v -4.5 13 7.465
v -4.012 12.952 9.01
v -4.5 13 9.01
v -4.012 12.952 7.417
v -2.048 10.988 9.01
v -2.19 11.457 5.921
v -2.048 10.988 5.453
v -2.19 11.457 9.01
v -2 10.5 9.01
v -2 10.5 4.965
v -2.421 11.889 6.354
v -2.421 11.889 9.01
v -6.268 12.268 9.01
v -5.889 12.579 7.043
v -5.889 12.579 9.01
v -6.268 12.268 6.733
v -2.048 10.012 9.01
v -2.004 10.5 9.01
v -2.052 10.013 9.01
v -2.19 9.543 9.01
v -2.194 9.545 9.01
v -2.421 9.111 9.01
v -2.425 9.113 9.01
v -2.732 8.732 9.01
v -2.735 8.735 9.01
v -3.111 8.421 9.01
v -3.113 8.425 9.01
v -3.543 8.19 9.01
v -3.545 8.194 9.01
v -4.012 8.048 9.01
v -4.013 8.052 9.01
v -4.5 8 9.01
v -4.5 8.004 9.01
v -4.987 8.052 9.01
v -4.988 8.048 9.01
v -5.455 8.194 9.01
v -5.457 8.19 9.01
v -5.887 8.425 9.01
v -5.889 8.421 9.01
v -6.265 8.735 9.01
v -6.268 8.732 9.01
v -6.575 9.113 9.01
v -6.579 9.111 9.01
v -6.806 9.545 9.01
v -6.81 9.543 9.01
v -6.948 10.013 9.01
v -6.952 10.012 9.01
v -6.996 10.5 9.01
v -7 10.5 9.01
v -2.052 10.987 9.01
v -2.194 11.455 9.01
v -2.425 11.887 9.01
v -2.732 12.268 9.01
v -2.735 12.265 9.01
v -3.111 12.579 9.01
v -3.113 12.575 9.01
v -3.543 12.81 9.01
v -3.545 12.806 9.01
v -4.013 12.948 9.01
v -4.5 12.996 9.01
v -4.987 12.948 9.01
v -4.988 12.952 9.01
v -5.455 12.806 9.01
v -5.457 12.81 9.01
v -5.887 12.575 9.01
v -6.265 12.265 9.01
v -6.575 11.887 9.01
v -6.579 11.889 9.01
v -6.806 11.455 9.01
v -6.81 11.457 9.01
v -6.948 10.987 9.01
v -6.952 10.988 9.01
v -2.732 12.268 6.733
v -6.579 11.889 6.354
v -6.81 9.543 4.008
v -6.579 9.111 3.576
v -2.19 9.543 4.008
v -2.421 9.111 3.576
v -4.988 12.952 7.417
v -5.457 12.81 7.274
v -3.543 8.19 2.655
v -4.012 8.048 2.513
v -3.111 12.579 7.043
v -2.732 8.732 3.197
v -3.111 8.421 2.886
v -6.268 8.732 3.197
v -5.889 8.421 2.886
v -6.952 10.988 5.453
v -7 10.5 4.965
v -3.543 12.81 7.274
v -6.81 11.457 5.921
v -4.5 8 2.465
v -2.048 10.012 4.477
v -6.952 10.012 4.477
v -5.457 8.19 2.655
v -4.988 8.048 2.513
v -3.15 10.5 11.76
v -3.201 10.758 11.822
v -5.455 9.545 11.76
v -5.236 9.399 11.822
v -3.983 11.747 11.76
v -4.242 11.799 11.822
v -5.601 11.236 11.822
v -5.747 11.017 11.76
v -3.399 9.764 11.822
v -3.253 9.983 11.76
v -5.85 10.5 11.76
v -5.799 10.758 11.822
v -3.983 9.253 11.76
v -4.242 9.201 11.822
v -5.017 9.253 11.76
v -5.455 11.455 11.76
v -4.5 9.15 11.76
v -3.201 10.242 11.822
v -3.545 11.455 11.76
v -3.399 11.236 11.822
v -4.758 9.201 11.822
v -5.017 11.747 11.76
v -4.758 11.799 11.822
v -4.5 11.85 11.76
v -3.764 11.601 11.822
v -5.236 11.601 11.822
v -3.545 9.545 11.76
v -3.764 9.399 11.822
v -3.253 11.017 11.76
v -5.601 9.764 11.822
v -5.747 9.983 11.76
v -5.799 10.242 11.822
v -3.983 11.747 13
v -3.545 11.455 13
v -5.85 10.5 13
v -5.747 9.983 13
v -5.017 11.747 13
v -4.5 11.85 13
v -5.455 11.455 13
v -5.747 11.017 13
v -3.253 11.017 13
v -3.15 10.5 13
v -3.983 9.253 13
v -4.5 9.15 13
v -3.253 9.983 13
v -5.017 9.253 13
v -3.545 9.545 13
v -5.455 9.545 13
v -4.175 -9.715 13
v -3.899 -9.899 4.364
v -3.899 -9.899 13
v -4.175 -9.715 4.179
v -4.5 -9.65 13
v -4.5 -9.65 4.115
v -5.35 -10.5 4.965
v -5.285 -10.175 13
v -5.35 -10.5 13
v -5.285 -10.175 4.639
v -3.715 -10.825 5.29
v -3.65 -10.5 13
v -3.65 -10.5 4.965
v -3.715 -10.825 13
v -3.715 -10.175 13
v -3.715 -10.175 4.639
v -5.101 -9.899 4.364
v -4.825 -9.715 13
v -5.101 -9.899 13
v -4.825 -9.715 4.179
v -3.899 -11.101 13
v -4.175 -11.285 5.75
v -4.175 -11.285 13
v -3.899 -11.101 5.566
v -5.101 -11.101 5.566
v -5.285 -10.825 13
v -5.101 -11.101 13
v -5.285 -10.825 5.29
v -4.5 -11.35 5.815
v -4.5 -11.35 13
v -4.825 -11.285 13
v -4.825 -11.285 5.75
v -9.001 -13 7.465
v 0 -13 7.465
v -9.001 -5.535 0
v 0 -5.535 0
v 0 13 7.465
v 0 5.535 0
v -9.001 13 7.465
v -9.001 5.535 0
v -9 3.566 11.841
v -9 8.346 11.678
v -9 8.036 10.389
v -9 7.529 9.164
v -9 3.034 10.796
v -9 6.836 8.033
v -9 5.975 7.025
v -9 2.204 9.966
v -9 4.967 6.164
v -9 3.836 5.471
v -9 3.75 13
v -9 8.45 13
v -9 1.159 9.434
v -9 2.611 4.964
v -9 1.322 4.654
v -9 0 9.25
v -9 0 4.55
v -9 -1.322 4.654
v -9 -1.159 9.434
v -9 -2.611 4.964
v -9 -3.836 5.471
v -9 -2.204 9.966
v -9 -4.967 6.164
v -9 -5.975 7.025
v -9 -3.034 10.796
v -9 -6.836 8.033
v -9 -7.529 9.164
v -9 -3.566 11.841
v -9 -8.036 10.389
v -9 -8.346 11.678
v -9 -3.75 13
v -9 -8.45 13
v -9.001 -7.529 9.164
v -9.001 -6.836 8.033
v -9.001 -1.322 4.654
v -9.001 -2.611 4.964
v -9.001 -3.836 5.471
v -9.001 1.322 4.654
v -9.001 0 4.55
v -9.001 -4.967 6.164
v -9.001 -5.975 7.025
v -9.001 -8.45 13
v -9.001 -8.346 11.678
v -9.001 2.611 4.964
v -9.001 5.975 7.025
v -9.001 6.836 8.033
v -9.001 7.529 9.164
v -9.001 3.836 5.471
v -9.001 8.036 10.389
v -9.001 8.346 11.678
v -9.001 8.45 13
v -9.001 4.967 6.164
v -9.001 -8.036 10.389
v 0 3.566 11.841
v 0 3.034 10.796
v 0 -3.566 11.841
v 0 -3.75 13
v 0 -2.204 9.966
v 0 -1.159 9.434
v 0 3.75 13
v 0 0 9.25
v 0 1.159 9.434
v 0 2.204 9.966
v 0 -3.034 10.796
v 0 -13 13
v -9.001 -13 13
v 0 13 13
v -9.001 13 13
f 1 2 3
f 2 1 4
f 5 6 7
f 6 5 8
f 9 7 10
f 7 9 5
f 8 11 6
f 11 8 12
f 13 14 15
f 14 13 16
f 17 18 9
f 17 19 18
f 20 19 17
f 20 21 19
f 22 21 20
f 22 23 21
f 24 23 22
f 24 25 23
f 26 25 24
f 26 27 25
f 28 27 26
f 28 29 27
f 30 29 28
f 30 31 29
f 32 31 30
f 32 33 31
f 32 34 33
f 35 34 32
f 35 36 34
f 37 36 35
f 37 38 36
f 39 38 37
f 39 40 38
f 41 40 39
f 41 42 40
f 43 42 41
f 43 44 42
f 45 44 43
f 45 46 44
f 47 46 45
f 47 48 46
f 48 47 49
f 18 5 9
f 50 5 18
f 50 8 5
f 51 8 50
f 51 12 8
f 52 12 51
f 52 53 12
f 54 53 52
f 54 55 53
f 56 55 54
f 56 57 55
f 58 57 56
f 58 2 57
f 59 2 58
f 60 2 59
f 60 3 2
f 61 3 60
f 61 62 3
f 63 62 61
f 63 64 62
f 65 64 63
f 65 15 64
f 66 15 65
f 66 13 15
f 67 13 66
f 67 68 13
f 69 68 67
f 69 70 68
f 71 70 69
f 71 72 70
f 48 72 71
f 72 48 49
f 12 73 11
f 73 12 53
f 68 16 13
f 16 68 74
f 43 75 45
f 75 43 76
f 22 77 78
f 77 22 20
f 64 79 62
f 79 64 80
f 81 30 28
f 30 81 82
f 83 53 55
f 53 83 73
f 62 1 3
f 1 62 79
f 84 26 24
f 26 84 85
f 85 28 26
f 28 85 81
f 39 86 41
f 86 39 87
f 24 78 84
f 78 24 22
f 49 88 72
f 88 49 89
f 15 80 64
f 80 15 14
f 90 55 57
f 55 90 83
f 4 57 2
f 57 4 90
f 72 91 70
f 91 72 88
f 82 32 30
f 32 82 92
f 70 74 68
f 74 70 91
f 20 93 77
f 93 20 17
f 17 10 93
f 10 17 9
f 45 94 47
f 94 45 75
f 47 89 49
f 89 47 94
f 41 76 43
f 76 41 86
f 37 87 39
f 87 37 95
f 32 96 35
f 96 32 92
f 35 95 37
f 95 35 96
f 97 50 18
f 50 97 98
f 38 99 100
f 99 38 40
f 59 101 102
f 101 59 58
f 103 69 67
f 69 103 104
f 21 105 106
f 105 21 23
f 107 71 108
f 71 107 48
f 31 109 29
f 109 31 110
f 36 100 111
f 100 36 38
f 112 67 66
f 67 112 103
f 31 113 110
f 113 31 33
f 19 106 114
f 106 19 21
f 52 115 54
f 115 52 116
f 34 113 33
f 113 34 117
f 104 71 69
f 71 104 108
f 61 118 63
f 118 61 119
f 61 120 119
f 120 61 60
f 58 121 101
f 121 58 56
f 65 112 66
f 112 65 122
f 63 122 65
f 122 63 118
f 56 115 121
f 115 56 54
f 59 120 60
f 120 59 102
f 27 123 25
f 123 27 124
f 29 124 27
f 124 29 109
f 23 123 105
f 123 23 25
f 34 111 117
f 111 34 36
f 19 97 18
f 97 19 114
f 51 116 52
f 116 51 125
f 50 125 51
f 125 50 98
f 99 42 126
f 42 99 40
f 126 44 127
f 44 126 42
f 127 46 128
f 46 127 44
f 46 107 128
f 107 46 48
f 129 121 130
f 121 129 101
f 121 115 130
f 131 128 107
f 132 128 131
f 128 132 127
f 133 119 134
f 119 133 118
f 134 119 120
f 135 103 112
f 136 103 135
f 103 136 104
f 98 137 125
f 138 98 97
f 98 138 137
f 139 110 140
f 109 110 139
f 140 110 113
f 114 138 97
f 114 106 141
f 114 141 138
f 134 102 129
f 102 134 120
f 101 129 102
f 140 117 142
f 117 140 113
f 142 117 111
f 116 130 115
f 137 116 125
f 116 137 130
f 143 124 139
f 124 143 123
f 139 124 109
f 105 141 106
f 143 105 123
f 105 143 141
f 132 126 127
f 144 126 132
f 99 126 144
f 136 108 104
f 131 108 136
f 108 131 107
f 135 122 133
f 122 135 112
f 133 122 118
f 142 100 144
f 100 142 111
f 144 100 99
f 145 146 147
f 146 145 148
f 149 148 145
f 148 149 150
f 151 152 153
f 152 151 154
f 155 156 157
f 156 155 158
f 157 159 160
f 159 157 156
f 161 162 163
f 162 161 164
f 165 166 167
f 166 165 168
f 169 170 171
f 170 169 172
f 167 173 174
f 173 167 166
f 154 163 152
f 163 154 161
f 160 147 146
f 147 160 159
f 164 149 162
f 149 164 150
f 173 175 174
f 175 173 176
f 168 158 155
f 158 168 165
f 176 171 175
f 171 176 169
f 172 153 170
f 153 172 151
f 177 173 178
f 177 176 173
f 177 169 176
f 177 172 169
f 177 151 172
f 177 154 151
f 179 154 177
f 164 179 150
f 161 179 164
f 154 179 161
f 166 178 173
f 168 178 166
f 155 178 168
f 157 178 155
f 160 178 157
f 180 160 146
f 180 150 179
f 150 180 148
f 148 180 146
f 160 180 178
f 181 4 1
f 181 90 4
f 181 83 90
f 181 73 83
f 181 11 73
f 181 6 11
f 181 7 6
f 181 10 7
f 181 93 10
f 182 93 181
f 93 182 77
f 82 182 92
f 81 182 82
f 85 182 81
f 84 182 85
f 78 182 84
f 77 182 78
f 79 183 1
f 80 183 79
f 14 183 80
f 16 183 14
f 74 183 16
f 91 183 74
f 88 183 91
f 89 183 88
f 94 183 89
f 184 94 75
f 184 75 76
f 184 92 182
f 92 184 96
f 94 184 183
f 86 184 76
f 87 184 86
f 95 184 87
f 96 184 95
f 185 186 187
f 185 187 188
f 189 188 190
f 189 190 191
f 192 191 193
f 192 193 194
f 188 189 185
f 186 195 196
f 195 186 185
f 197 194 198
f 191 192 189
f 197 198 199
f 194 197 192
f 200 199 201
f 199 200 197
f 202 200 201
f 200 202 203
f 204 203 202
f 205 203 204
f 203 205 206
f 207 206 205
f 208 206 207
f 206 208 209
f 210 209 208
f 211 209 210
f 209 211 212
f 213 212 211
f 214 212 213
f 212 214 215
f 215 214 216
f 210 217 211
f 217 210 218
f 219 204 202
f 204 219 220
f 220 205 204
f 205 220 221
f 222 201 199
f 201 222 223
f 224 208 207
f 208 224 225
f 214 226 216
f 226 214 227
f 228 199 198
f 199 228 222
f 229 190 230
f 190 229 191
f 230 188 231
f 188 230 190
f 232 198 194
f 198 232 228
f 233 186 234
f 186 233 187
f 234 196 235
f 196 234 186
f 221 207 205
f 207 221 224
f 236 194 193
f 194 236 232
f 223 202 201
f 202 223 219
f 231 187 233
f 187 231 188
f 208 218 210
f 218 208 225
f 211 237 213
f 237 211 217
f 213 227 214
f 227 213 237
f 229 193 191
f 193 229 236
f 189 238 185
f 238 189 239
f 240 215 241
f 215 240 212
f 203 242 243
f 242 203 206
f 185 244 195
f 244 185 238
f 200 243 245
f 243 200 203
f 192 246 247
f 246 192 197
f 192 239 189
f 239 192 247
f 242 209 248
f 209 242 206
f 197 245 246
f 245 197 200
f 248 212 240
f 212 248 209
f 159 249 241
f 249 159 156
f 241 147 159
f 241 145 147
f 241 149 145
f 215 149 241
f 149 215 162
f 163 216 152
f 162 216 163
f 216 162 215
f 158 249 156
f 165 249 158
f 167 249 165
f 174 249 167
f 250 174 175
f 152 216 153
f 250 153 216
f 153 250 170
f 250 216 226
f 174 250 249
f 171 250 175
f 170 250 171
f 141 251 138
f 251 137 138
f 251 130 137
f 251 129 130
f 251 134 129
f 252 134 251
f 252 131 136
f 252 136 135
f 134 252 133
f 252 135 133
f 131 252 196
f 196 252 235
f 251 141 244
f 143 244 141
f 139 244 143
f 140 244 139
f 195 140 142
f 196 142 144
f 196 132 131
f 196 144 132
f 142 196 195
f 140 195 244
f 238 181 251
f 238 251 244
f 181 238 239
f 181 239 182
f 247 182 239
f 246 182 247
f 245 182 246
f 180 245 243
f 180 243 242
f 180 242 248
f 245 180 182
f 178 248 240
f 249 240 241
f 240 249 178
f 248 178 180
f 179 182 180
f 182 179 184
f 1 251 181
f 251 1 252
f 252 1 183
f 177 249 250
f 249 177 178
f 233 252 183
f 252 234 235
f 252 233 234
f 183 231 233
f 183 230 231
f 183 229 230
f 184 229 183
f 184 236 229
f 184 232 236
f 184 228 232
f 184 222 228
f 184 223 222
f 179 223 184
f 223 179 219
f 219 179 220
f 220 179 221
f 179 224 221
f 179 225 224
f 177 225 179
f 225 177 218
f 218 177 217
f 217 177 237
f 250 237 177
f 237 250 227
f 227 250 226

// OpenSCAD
// file: nut_cutter.scad
module nut_cutter(w=5.65,depth=6,ins_delta=0.4,ins_depth=2,trans_depth=3)
{
    d=0; // z position
    chep_nut_d=w * (2/sqrt(3)); // nut tight hex
    chep_nut_depth=depth; // total depth
    chep_nut_ins_d=chep_nut_d+ins_delta; // enlarged insertion hex
    chep_nut_ins_depth=ins_depth; // insertion depth
    chep_nut_transition_depth=trans_depth; // easier 3D print, conical transition

    // duboki tijesni utor za maticu
    translate([0,0,-d/2+chep_nut_depth/2-0.001])
      cylinder(d=chep_nut_d,h=chep_nut_depth,$fn=6,center=true);
    // plitki labavi utor za maticu
    translate([0,0,-d/2+chep_nut_ins_depth/2-0.001])
      cylinder(d=chep_nut_ins_d,h=chep_nut_ins_depth,$fn=6,center=true);
    // konusni prijelaz za lakše printanje
    if(1)
    translate([0,0,-d/2+chep_nut_depth+chep_nut_transition_depth/2-0.001])
      cylinder(d1=chep_nut_d,d2=0,h=chep_nut_transition_depth+0.005,$fn=6,center=true);
}

module head_cutter(d=6,h=5)
{
  delta=0.01;
  translate([0,0,-delta])
  cylinder(d=d,h=h+2*delta,$fn=32);
  translate([0,0,h])
    cylinder(d1=d,d2=0,h*2/3,$fn=32);
    
}

//nut_cutter();
//head_cutter();
// main file
// for tube 8x6x1

/* all measures in mm */
// 0.8mm nozzle 0.3mm layer
include <nut_cutter.scad>

/* todo:
** [x] dent holes must be aligned, not dents
** [x] narrower and smaller big dents
** [x] intercusp strain release smaller, 0.1mm
** [x] remove intercuspidation
** [x] M3 thread: -0.15
** [x] M4 thread: -0.20, waterdrop
** [x] 30 mm mount holes M4
** [x] thread for M4
** [x] cut-snap 2 piece
** [x] subtract cube, leave only lower cut-snap
** [x] 2 screws M3 to tighten cut-snap
** [x] thread for M3
** [x] remove some dents - cannot assemble!!
*/

/* Z-extrusion height (vertical) enough to hold M3 screw hole */
zdim = 20;
/* X-length */
xdim = 26;
/* Y-width */
ydim = 26;

/* free space between parts */
freespace_big = 0.2;
freespace_small = 0.0;

/* number of small dents */
ndent1 = 40;
/* dent depth */
ddent1 = 0.0; // 0.5 default, 0 to disable
/* dent width large */
wdent1l = 0.8;
/* dent width small */
wdent1s = 0.3; 
/* big wheel radius (with dents d = 16.7mm)  */
rbig = (16.7+freespace_big)/2;
/* big wheel height */
zbig = 5;

/* number of big dents = half of small dents */
ndent2 = ndent1/2;
/* dent depth */
ddent2 = 0.5; // 0.5 default, 0.0 to disable
/* dent width large */
wdent2l = 0.8;
/* dent width small */
wdent2s = 0.3;
/* small wheel radius (with dents d = 13.0mm) */
rsmall = (13.0+freespace_small)/2;
zsmall = 6;

/* make sure we cut it all */
overcut = 0.001;

// hole that holds the tube
rtube = 7.5/2;
// ztube = 15; // what remains when zbig+zsmall

/* mounting hole radius */
rmounthole = 1.1/2;
/* mounting holes distance */
dmounthole = 0; // 22 default, 0 disable

/* tightening screws y distance (B careful, do not intersect dents) */
dtighthole = 21;

dztight = [4.5,zdim-4]; // tightnening screws z distances

/* intercuspidation Y center aligns with tightening hole */
ycuspcenter = dtighthole/2;
/* intercuspidation depth */
dcusp = 4;
/* intercuspidation small, big */
icusps = 4;
icuspb = 5;
freecusp = 0.1;

module droplet_profile(h, r, rotation) {
        union()
        {
          cylinder(h = h, r = r, $fa=360/16, $fs=0.5, center=true);
            rotate([0,0,rotation])
              linear_extrude(height = h, twist = 0, convexity = 2, center=true)
                polygon([
                 [ -r * sqrt(2)/2, r * sqrt(2)/2],
                 [              0, r * sqrt(2)],
                 [  r * sqrt(2)/2, r * sqrt(2)/2],
                 ]);
        }

}

module eye_profile(h, r, rotation) {
        union()
        {
          cylinder(h = h, r = r, $fa=360/16, $fs=0.5, center=true);
          rotate([0,0,rotation])
              linear_extrude(height = h, twist = 0, convexity = 2, center=true)
                polygon([
                 [ -r * sqrt(2)/2, r * sqrt(2)/2],
                 [              0, r * sqrt(2)],
                 [  r * sqrt(2)/2, r * sqrt(2)/2],
                 ]);
          rotate([0,0,180+rotation])
              linear_extrude(height = h, twist = 0, convexity = 2, center=true)
                polygon([
                 [ -r * sqrt(2)/2, r * sqrt(2)/2],
                 [              0, r * sqrt(2)],
                 [  r * sqrt(2)/2, r * sqrt(2)/2],
                 ]);
        }
}

module sprocket_adapter() {
delta=0.001;
union() {
  difference() {
    translate([0,0,zdim/2])
      cube([xdim, ydim, zdim], center=true);
    union() {
      translate([0,0,zdim-zbig-zsmall])
          cylinder(h=zbig+delta, r=rbig, $fa=360/ndent1, $fs=0.5, center=false);
      translate([0,0,zdim-zbig-zsmall])
          cylinder(h=zdim+delta, r=rsmall, $fa=360/ndent2, $fs=0.5, center=false);
      translate([0,0,-delta])
      cylinder(h=zdim-zbig-zsmall+2*delta, r=rtube, $fa=360/ndent2, $fs=0.5, center=false);


      /* 2 holes for screws cca 30 mm apart */
      translate([-dmounthole/2,0,zdim/2])
        eye_profile(h = zdim + overcut, r = rmounthole, rotation = -90);
      translate([ dmounthole/2,0,zdim/2])
        eye_profile(h = zdim + overcut, r = rmounthole, rotation = 90);

      /* tightening M3 screw, larger in "removed" part */
    for(zscrew=dztight)
    {
      translate([0,dtighthole/2,zscrew])
        rotate([0,90,0])
          cylinder(d=2.7,h=xdim+overcut,$fn=16,center=true); // circular
          //eye_profile(h = xdim+overcut, r = rM3free, rotation = -90); // droplet shape

    translate([-xdim/2,dtighthole/2,zscrew])
      rotate([0,90,0])
         head_cutter(d=5,h=9);

      /* tightening M3 screw, with droplet shape, smaller/thread in "extended" part */
    translate([0,-dtighthole/2,zscrew])
      rotate([0,90,0])
        cylinder(d=1.7,h=xdim+overcut,$fn=16,center=true); // circular
          //eye_profile(h = xdim+overcut, r = rM3thread, rotation = -90); // droplet shape
    }
      /* polygon cuts this in snap-on half */
      translate([0,0,-delta/2])
      linear_extrude(height = zdim+delta, twist = 0, convexity = 8)
        polygon([[ 0,               -ydim/2],
                 [ xdim,            -ydim/2],
                 [ xdim,             ydim/2],
                 [ 0,                ydim/2],
                 [ 0,                ycuspcenter+icusps/2],

/* intercuspidation removed */
/*
                 [ dcusp,            ycuspcenter+icuspb/2],
                 [ dcusp,            ycuspcenter-icuspb/2],
                 [ 0,                ycuspcenter-icusps/2],
                 [ 0,               -ycuspcenter+icusps/2+freecusp],
                 [-dcusp-freecusp,  -ycuspcenter+icuspb/2+freecusp],
                 [-dcusp-freecusp,  -ycuspcenter-icuspb/2-freecusp],
                 [ 0,               -ycuspcenter-icusps/2-freecusp]
*/
                 ]*(1+delta));

      /* cuts off upper notch for easier insertion */
      translate([dcusp/2,0,zbig/2])
        cube([dcusp,ydim,zbig], center = true);

      /* cut off corners */
      for(i=[-1:2:1])
      translate([-xdim/2,ydim*i*0.92,zdim/2])
        rotate([0,0,45])
          cube([xdim,ydim,zdim+delta],center=true);
    }
  }

      /* big radius, small dents */
      for(angle = [360/ndent1/2 : 360/ndent1 : 360])
        if(angle > 180-50 && angle < 180+50)
        rotate([0,0,angle])
          translate([rbig-ddent1/2,0,zdim-zbig-zsmall])
          {
            linear_extrude(height = zbig, twist = 0, convexity = 2)
              polygon([[ ddent1/2,        -wdent1l/2],
                       [-ddent1/2,        -wdent1s/2],
                       [-ddent1/2,         wdent1s/2],
                       [ ddent1/2,         wdent1l/2]]);
          }

      /* small radius, big dents */
      for(angle = [360/ndent2/2 : 360/ndent2 : 360])
        if(angle > 180-30 && angle < 180+30)
        rotate([0,0,angle])
          translate([rsmall-ddent2/2,0,zdim-zsmall])
          {
            linear_extrude(height = zsmall, twist = 0, convexity = 2)
              polygon([[ ddent2/2,        -wdent2l/2],
                       [-ddent2/2,        -wdent2s/2],
                       [-ddent2/2,         wdent2s/2],
                       [ ddent2/2,         wdent2l/2]]);
          }
}

}

// cot for tube clamp only
module tube_clamp()
{
  difference()
  {
    sprocket_adapter();
    translate([0,0,zdim-zbig-zsmall+0.001])
      cylinder(d=xdim*2,h=zbig+zsmall,$fn=8);
  }
}

module print_tube_clamp()
{
  translate([0,0,xdim/2])
  rotate([0,-90,0])
    tube_clamp();
}

// printable position
module print_sprocket_adapter()
{
  translate([0,0,xdim/2])
  rotate([0,-90,0])
    sprocket_adapter();
}

if(1)
print_tube_clamp();

if(0)
print_sprocket_adapter();
